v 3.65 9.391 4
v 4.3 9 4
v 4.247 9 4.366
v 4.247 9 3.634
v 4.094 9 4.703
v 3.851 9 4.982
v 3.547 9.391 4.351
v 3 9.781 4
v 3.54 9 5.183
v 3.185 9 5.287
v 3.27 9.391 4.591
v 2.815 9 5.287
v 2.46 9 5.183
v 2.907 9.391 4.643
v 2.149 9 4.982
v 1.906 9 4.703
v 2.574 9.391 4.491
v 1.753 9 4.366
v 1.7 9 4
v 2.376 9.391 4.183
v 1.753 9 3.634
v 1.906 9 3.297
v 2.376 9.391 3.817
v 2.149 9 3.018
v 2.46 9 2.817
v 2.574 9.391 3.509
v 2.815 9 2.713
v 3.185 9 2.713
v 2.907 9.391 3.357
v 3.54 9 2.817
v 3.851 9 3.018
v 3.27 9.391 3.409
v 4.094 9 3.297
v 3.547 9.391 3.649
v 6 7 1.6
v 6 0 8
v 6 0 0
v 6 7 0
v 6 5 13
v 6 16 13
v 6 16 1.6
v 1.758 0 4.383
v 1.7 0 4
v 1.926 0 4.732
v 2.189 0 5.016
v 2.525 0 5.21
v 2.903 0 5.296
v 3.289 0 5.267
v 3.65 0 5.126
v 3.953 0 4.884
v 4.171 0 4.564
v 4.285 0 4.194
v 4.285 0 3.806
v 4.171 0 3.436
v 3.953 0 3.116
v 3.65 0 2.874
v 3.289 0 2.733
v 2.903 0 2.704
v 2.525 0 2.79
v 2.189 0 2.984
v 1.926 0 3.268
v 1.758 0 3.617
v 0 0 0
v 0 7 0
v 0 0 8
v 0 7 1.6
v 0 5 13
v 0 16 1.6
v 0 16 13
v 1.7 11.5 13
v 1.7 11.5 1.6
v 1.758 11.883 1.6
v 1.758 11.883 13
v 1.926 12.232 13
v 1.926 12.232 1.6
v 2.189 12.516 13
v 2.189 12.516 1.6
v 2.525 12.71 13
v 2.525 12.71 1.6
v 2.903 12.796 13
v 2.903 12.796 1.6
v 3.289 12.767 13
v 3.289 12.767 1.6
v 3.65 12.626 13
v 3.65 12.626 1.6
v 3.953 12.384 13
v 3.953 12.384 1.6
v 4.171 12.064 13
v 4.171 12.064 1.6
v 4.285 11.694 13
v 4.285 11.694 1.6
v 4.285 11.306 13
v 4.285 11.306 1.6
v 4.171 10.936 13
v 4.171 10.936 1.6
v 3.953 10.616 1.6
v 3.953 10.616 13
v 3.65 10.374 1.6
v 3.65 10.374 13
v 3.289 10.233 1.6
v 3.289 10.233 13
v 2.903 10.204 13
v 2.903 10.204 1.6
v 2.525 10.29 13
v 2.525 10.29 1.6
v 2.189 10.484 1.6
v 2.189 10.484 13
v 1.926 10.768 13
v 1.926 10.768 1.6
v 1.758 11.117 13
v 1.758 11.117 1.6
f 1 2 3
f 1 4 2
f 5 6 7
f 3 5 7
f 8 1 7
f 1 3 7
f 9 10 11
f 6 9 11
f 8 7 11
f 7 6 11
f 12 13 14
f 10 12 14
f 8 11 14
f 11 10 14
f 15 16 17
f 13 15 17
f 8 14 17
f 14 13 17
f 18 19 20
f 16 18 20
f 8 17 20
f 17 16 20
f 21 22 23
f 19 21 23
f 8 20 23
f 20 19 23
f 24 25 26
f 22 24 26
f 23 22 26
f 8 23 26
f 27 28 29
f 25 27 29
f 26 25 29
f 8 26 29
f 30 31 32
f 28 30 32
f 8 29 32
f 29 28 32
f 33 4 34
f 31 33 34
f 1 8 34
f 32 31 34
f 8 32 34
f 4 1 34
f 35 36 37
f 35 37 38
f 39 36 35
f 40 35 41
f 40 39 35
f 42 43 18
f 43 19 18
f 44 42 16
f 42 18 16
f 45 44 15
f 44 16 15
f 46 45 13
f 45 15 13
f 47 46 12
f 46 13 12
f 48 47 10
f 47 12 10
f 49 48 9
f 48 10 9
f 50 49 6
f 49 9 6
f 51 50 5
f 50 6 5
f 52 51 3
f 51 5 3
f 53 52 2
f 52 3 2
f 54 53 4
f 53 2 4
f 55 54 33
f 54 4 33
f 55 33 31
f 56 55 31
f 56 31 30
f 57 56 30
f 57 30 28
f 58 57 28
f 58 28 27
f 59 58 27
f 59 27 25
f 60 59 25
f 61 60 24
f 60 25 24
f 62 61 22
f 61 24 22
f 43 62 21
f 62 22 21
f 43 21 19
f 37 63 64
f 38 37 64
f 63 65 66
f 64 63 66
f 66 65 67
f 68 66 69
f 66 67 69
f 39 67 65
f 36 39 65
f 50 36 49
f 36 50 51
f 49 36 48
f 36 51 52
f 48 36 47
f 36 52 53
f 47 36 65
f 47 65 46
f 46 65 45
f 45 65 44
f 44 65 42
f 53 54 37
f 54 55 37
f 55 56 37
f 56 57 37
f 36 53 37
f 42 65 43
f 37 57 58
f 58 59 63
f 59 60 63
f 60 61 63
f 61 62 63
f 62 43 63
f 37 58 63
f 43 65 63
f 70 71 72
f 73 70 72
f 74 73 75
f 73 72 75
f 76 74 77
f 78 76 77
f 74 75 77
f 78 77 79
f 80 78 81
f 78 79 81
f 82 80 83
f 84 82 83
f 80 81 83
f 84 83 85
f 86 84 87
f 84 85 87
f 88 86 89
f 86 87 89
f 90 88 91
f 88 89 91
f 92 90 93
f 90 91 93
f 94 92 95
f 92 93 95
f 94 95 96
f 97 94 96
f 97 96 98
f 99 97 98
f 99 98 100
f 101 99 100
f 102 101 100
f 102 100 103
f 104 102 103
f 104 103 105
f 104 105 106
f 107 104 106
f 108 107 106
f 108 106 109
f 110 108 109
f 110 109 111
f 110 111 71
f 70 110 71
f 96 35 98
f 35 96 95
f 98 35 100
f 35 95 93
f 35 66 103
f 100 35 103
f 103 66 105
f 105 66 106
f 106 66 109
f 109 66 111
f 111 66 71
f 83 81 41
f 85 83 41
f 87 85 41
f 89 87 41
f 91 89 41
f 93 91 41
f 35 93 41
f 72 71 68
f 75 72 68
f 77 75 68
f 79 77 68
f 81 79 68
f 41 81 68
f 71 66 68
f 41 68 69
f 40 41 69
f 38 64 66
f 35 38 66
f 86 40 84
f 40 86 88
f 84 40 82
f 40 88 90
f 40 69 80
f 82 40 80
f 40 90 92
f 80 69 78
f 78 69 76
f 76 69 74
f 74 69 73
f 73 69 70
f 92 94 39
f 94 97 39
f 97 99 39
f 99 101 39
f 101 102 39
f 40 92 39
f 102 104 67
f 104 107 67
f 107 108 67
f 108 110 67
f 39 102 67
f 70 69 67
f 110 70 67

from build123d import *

# Parameters (mm, degrees)
F1_DEPTH = 6
F4_D     = 2.6
F5_D     = 2.6
F5_DEPTH = 9
F5_TIP   = 0.7811188047


with BuildPart() as f1:
    # F0 (on Right) → F1 (new body)
    with BuildSketch(Plane.YZ):
        Polygon((0, 8), (0, 0), (7, 0), (7, 1.6), (16, 1.6), (16, 13), (5, 13), align=None)
    extrude(amount=F1_DEPTH)

    # F4 (through all)
    with Locations(Plane.XY.offset(13)):
        with Locations((3, 11.5)):
            Hole(F4_D / 2)

    # F5
    with Locations(Plane.XZ):
        with Locations((3, 4)):
            Hole(F5_D / 2, depth=F5_DEPTH)
            with Locations((0, 0, -(F5_DEPTH + F5_TIP / 2))):  # 118° drill point
                Cone(0, F5_D / 2, F5_TIP, mode=Mode.SUBTRACT)


solid = f1.part
